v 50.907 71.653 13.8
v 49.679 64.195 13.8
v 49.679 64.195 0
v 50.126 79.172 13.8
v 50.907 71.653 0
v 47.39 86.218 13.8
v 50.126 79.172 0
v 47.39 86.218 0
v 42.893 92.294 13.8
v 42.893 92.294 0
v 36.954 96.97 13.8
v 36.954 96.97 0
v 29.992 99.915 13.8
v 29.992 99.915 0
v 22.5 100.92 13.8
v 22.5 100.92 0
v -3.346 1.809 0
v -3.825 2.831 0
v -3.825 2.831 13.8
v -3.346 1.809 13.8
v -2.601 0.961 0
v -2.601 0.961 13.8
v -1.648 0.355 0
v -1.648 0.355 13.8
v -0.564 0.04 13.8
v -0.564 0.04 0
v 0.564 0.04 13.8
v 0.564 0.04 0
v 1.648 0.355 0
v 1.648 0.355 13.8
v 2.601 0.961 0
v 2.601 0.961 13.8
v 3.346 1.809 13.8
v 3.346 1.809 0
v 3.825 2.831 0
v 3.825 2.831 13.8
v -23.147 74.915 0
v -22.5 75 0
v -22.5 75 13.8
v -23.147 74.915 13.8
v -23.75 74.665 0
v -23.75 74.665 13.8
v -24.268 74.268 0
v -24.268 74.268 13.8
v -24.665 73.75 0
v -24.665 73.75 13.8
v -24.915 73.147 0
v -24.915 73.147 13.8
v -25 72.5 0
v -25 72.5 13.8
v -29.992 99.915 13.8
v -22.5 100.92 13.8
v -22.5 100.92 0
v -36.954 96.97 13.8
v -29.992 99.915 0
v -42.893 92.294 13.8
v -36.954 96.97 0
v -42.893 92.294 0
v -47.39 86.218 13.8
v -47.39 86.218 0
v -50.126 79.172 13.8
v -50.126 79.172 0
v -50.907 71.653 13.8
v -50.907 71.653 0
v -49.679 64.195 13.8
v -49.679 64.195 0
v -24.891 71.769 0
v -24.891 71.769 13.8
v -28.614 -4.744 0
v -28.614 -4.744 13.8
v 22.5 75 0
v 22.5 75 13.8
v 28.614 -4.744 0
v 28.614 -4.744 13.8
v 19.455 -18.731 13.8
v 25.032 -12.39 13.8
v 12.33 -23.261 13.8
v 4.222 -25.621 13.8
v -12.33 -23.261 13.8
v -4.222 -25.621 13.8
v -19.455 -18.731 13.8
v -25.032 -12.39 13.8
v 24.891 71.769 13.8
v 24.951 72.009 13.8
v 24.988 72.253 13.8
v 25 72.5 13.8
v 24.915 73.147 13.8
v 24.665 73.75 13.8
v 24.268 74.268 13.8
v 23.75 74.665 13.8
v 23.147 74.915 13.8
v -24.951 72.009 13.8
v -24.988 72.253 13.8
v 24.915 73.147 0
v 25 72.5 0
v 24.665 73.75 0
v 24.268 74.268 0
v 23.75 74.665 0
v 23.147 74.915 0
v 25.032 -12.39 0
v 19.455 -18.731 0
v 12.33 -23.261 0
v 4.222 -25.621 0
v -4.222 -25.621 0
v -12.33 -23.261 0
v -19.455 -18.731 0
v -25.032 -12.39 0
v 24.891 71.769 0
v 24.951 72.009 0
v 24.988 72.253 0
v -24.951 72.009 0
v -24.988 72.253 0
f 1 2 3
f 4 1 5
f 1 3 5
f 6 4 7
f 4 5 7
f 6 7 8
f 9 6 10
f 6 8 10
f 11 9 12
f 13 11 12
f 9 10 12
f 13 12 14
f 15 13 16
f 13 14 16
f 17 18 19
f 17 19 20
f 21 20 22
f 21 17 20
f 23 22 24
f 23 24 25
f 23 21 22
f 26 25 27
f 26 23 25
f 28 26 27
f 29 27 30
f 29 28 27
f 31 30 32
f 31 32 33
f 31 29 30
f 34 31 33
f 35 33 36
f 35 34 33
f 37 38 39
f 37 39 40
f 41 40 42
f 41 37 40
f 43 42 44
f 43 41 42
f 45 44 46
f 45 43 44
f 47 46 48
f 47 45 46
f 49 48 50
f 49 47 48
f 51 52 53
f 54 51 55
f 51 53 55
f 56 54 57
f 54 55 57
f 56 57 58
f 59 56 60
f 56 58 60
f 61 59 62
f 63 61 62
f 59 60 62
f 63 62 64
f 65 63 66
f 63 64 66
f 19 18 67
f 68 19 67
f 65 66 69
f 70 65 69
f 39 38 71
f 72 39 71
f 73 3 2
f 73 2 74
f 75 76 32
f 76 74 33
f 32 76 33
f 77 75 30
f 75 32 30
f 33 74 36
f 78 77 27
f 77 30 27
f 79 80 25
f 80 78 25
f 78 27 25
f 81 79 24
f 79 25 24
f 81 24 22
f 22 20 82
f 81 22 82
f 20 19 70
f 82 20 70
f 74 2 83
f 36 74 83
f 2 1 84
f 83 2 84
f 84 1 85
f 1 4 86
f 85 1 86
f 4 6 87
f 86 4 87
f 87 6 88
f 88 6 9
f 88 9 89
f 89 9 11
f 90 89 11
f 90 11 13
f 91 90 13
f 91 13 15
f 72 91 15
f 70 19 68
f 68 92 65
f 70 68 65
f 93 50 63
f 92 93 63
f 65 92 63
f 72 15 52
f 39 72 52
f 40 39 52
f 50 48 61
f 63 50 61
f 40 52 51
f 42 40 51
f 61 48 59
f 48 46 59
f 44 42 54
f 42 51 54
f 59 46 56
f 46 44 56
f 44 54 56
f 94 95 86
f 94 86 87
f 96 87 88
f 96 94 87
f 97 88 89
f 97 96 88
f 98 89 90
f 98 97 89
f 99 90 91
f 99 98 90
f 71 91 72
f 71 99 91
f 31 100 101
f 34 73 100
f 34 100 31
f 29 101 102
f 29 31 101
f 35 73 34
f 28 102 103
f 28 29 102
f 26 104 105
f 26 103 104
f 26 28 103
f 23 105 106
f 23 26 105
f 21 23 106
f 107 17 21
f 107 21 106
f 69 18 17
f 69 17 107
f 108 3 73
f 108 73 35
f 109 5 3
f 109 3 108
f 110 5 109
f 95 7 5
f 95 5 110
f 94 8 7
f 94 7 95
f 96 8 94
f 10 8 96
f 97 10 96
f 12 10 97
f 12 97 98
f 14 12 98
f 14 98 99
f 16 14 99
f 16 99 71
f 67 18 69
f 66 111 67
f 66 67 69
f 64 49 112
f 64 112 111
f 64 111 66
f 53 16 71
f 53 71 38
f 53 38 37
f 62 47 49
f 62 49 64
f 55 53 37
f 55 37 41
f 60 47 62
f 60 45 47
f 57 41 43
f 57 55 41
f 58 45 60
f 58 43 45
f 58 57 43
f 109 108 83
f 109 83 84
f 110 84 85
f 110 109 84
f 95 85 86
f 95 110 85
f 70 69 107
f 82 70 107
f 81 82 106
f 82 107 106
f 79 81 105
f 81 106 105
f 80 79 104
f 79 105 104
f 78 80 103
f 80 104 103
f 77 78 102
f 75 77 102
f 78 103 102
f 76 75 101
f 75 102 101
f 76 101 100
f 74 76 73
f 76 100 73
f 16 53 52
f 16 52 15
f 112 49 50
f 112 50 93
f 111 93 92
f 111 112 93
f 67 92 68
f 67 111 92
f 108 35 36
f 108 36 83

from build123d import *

# Parameters (mm, degrees)
PAD_DEPTH = 13.8


with BuildPart() as part:
    # Sketch → Pad (new body)
    with BuildSketch(Plane.XY):
        with BuildLine():
            Line((-22.5, 100.92), (22.5, 100.92))
            ThreePointArc((49.679403, 64.194795), (45.344368, 89.406544), (22.5, 100.92))
            Line((49.679403, 64.194795), (28.613925, -4.743552))
            ThreePointArc((-28.613925, -4.743552), (0, -25.92), (28.613925, -4.743552))
            Line((-49.679403, 64.194795), (-28.613925, -4.743552))
            ThreePointArc((-22.5, 100.92), (-45.344368, 89.406544), (-49.679403, 64.194795))
        make_face()
        with BuildLine():
            Line((3.825391, 2.831076), (24.890869, 71.769422))
            ThreePointArc((24.890869, 71.769422), (24.972567, 72.130658), (25, 72.5))
            ThreePointArc((25, 72.5), (24.267767, 74.267767), (22.5, 75))
            Line((-22.5, 75), (22.5, 75))
            ThreePointArc((-22.5, 75), (-24.267767, 74.267767), (-25, 72.5))
            ThreePointArc((-25, 72.5), (-24.972567, 72.130658), (-24.890869, 71.769422))
            Line((-3.825391, 2.831076), (-24.890869, 71.769422))
            ThreePointArc((-3.825391, 2.831076), (0, 0), (3.825391, 2.831076))
        make_face(mode=Mode.SUBTRACT)
    extrude(amount=PAD_DEPTH)


solid = part.part
